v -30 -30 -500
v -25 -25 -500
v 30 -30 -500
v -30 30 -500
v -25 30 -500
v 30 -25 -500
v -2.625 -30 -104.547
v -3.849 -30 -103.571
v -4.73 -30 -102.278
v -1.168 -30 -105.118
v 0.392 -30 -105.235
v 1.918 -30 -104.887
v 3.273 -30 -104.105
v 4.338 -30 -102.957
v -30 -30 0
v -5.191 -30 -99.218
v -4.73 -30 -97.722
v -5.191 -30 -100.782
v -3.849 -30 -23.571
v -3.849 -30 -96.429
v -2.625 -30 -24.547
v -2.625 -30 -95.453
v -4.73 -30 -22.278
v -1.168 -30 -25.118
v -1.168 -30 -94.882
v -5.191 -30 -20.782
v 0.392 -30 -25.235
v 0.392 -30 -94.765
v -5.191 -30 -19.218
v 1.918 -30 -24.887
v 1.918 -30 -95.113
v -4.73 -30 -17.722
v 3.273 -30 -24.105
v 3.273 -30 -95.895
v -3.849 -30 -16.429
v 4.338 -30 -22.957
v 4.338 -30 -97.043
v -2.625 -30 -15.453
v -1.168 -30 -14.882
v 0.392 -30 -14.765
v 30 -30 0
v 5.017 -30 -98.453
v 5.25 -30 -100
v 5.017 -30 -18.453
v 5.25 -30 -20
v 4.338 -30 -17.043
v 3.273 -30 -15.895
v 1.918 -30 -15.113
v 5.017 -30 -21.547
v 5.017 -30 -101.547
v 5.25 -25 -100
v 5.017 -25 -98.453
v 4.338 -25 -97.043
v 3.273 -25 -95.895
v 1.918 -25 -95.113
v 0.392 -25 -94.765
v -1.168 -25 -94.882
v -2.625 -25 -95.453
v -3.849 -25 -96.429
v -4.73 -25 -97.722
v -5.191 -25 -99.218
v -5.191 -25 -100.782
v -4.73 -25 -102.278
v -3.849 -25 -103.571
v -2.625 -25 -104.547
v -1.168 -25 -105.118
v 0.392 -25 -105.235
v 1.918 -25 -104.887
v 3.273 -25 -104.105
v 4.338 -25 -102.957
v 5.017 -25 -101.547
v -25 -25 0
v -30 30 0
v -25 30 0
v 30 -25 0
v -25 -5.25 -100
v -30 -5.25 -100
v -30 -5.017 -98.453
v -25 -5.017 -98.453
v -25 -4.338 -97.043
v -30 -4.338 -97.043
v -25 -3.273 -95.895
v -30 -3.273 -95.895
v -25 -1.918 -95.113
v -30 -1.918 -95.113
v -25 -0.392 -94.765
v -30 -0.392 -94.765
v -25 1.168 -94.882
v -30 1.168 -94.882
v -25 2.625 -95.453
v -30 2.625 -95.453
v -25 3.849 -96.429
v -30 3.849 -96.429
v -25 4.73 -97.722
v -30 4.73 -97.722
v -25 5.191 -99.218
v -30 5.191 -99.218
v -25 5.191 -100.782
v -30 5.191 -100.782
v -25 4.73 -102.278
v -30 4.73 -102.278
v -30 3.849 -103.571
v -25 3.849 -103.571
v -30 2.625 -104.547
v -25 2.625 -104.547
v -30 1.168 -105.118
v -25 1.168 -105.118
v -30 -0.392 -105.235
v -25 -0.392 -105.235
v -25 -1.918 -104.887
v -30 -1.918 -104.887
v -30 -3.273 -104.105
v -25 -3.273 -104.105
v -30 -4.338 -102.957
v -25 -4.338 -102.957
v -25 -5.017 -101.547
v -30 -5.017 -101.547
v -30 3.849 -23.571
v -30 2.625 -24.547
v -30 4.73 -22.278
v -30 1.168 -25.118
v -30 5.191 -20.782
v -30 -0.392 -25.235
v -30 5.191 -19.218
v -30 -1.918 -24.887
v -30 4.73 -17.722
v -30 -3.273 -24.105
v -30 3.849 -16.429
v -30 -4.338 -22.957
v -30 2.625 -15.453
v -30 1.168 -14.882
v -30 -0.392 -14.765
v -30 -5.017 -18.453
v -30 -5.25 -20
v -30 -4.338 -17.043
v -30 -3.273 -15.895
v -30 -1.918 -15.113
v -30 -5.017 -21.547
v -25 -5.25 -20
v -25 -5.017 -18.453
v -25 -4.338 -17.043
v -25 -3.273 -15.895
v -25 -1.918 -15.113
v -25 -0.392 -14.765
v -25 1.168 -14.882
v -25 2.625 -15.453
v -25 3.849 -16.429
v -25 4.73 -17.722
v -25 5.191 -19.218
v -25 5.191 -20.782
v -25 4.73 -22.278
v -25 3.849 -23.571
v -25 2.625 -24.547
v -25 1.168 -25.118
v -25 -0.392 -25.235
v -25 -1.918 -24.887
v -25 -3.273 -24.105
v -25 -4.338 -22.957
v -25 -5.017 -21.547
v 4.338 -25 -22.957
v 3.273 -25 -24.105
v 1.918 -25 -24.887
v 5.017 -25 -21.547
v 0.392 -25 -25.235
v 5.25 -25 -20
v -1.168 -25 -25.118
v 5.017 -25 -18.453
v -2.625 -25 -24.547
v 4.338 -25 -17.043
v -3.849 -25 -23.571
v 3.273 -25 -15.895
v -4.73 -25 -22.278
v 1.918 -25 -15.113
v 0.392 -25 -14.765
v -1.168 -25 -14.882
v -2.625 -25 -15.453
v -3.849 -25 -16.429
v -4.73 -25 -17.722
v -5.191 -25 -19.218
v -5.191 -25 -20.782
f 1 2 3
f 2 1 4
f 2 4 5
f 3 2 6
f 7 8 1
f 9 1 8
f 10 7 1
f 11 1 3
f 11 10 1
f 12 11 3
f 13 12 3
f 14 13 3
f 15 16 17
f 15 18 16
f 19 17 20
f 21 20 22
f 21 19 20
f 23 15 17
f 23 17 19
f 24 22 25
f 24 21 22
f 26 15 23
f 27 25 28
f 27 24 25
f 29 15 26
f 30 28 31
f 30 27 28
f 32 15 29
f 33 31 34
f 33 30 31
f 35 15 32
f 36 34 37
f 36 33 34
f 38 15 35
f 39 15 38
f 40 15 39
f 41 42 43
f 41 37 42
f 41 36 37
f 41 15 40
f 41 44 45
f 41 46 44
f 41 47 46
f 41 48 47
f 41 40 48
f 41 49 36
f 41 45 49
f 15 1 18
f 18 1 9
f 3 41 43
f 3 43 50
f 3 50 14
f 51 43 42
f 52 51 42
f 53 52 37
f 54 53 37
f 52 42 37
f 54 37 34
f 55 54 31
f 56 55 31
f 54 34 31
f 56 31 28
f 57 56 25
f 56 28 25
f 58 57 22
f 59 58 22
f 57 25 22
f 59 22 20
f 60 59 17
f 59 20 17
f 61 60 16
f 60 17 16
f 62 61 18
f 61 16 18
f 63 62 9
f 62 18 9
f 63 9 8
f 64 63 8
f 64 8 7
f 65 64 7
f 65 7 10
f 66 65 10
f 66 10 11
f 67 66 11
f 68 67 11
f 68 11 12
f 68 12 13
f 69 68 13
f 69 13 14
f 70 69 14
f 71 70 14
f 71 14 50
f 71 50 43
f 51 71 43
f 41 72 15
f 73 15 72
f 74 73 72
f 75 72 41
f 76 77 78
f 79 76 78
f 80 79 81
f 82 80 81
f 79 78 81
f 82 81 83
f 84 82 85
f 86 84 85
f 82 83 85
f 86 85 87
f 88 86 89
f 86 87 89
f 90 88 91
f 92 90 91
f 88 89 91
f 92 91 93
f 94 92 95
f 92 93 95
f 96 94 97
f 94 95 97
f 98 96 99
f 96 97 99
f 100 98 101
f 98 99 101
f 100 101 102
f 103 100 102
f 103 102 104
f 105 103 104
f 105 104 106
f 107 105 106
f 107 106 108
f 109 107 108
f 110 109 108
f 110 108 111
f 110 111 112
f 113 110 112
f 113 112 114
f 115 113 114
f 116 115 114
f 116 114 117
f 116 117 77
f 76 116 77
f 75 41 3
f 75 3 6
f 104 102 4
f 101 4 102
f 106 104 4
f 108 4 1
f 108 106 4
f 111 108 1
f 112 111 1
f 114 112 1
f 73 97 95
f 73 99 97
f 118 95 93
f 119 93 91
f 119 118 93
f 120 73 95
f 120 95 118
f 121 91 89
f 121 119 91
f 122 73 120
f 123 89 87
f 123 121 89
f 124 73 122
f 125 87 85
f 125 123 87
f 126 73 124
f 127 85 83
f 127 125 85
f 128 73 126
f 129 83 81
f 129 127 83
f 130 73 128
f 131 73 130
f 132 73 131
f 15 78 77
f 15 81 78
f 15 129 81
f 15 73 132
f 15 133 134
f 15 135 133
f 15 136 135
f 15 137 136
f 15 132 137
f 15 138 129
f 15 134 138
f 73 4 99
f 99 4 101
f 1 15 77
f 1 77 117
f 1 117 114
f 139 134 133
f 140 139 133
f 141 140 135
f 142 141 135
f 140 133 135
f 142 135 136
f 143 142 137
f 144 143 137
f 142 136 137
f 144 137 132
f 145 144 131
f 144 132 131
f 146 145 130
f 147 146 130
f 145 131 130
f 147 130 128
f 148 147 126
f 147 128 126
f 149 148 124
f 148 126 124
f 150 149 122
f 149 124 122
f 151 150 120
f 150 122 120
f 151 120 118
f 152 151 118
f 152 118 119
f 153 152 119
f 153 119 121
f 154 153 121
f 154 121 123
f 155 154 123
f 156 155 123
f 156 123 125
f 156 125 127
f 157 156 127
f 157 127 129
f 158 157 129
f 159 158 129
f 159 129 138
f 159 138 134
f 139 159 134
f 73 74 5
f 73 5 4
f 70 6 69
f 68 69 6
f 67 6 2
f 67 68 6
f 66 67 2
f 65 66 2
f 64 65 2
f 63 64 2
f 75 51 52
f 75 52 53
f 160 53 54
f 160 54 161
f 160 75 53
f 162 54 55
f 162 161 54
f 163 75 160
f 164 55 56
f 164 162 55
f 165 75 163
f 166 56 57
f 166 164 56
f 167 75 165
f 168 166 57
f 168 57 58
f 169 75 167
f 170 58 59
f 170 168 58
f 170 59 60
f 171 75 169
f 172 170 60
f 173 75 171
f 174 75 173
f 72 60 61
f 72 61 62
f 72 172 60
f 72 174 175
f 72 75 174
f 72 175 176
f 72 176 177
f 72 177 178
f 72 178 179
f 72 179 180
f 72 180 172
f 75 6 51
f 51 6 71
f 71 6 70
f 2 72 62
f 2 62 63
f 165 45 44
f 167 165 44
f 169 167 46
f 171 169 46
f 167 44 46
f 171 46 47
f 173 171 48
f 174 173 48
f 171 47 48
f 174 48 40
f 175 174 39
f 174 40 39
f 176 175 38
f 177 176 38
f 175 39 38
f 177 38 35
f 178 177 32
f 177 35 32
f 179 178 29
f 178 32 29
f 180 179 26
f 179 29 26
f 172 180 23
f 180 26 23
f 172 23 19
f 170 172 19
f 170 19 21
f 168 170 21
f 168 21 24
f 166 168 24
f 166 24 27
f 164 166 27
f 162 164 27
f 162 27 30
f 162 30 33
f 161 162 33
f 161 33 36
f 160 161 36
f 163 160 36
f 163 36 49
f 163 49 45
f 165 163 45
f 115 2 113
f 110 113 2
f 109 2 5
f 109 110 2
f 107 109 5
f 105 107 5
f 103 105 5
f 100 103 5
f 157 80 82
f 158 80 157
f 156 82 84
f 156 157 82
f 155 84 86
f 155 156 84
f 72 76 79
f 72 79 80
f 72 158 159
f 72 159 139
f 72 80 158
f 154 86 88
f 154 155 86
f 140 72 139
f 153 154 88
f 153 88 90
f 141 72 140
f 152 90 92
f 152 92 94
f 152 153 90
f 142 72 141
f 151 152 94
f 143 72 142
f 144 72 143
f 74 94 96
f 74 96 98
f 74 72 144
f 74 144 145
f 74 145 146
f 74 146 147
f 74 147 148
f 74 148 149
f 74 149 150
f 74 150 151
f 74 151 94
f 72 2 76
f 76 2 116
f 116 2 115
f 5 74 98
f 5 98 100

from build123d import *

# Parameters (mm, degrees)
F1_DEPTH = 500
F2_R     = 5.25
F3_DEPTH = 10
F4_R     = 5.25
F5_DEPTH = 10


with BuildPart() as f1:
    # F0 (on Top) → F1 (new body)
    with BuildSketch(Plane.XY):
        Polygon((-25, 30), (-30, 30), (-30, -30), (30, -30), (30, -25), (-25, -25), align=None)
    extrude(amount=-F1_DEPTH)

    # F2 (on face) → F3 (cut)
    with BuildSketch(Plane.XZ.offset(30)):
        with Locations((0, -20)):
            Circle(F2_R)
        with Locations((0, -100)):
            Circle(F2_R)
    extrude(amount=-F3_DEPTH, mode=Mode.SUBTRACT)

    # F4 (on face) → F5 (cut)
    with BuildSketch(Plane(origin=(-30, 0, 0), x_dir=(0, -1, 0), z_dir=(-1, 0, 0))):
        with Locations((0, -20)):
            Circle(F4_R)
        with Locations((0, -100)):
            Circle(F4_R)
    extrude(amount=-F5_DEPTH, mode=Mode.SUBTRACT)


solid = f1.part
